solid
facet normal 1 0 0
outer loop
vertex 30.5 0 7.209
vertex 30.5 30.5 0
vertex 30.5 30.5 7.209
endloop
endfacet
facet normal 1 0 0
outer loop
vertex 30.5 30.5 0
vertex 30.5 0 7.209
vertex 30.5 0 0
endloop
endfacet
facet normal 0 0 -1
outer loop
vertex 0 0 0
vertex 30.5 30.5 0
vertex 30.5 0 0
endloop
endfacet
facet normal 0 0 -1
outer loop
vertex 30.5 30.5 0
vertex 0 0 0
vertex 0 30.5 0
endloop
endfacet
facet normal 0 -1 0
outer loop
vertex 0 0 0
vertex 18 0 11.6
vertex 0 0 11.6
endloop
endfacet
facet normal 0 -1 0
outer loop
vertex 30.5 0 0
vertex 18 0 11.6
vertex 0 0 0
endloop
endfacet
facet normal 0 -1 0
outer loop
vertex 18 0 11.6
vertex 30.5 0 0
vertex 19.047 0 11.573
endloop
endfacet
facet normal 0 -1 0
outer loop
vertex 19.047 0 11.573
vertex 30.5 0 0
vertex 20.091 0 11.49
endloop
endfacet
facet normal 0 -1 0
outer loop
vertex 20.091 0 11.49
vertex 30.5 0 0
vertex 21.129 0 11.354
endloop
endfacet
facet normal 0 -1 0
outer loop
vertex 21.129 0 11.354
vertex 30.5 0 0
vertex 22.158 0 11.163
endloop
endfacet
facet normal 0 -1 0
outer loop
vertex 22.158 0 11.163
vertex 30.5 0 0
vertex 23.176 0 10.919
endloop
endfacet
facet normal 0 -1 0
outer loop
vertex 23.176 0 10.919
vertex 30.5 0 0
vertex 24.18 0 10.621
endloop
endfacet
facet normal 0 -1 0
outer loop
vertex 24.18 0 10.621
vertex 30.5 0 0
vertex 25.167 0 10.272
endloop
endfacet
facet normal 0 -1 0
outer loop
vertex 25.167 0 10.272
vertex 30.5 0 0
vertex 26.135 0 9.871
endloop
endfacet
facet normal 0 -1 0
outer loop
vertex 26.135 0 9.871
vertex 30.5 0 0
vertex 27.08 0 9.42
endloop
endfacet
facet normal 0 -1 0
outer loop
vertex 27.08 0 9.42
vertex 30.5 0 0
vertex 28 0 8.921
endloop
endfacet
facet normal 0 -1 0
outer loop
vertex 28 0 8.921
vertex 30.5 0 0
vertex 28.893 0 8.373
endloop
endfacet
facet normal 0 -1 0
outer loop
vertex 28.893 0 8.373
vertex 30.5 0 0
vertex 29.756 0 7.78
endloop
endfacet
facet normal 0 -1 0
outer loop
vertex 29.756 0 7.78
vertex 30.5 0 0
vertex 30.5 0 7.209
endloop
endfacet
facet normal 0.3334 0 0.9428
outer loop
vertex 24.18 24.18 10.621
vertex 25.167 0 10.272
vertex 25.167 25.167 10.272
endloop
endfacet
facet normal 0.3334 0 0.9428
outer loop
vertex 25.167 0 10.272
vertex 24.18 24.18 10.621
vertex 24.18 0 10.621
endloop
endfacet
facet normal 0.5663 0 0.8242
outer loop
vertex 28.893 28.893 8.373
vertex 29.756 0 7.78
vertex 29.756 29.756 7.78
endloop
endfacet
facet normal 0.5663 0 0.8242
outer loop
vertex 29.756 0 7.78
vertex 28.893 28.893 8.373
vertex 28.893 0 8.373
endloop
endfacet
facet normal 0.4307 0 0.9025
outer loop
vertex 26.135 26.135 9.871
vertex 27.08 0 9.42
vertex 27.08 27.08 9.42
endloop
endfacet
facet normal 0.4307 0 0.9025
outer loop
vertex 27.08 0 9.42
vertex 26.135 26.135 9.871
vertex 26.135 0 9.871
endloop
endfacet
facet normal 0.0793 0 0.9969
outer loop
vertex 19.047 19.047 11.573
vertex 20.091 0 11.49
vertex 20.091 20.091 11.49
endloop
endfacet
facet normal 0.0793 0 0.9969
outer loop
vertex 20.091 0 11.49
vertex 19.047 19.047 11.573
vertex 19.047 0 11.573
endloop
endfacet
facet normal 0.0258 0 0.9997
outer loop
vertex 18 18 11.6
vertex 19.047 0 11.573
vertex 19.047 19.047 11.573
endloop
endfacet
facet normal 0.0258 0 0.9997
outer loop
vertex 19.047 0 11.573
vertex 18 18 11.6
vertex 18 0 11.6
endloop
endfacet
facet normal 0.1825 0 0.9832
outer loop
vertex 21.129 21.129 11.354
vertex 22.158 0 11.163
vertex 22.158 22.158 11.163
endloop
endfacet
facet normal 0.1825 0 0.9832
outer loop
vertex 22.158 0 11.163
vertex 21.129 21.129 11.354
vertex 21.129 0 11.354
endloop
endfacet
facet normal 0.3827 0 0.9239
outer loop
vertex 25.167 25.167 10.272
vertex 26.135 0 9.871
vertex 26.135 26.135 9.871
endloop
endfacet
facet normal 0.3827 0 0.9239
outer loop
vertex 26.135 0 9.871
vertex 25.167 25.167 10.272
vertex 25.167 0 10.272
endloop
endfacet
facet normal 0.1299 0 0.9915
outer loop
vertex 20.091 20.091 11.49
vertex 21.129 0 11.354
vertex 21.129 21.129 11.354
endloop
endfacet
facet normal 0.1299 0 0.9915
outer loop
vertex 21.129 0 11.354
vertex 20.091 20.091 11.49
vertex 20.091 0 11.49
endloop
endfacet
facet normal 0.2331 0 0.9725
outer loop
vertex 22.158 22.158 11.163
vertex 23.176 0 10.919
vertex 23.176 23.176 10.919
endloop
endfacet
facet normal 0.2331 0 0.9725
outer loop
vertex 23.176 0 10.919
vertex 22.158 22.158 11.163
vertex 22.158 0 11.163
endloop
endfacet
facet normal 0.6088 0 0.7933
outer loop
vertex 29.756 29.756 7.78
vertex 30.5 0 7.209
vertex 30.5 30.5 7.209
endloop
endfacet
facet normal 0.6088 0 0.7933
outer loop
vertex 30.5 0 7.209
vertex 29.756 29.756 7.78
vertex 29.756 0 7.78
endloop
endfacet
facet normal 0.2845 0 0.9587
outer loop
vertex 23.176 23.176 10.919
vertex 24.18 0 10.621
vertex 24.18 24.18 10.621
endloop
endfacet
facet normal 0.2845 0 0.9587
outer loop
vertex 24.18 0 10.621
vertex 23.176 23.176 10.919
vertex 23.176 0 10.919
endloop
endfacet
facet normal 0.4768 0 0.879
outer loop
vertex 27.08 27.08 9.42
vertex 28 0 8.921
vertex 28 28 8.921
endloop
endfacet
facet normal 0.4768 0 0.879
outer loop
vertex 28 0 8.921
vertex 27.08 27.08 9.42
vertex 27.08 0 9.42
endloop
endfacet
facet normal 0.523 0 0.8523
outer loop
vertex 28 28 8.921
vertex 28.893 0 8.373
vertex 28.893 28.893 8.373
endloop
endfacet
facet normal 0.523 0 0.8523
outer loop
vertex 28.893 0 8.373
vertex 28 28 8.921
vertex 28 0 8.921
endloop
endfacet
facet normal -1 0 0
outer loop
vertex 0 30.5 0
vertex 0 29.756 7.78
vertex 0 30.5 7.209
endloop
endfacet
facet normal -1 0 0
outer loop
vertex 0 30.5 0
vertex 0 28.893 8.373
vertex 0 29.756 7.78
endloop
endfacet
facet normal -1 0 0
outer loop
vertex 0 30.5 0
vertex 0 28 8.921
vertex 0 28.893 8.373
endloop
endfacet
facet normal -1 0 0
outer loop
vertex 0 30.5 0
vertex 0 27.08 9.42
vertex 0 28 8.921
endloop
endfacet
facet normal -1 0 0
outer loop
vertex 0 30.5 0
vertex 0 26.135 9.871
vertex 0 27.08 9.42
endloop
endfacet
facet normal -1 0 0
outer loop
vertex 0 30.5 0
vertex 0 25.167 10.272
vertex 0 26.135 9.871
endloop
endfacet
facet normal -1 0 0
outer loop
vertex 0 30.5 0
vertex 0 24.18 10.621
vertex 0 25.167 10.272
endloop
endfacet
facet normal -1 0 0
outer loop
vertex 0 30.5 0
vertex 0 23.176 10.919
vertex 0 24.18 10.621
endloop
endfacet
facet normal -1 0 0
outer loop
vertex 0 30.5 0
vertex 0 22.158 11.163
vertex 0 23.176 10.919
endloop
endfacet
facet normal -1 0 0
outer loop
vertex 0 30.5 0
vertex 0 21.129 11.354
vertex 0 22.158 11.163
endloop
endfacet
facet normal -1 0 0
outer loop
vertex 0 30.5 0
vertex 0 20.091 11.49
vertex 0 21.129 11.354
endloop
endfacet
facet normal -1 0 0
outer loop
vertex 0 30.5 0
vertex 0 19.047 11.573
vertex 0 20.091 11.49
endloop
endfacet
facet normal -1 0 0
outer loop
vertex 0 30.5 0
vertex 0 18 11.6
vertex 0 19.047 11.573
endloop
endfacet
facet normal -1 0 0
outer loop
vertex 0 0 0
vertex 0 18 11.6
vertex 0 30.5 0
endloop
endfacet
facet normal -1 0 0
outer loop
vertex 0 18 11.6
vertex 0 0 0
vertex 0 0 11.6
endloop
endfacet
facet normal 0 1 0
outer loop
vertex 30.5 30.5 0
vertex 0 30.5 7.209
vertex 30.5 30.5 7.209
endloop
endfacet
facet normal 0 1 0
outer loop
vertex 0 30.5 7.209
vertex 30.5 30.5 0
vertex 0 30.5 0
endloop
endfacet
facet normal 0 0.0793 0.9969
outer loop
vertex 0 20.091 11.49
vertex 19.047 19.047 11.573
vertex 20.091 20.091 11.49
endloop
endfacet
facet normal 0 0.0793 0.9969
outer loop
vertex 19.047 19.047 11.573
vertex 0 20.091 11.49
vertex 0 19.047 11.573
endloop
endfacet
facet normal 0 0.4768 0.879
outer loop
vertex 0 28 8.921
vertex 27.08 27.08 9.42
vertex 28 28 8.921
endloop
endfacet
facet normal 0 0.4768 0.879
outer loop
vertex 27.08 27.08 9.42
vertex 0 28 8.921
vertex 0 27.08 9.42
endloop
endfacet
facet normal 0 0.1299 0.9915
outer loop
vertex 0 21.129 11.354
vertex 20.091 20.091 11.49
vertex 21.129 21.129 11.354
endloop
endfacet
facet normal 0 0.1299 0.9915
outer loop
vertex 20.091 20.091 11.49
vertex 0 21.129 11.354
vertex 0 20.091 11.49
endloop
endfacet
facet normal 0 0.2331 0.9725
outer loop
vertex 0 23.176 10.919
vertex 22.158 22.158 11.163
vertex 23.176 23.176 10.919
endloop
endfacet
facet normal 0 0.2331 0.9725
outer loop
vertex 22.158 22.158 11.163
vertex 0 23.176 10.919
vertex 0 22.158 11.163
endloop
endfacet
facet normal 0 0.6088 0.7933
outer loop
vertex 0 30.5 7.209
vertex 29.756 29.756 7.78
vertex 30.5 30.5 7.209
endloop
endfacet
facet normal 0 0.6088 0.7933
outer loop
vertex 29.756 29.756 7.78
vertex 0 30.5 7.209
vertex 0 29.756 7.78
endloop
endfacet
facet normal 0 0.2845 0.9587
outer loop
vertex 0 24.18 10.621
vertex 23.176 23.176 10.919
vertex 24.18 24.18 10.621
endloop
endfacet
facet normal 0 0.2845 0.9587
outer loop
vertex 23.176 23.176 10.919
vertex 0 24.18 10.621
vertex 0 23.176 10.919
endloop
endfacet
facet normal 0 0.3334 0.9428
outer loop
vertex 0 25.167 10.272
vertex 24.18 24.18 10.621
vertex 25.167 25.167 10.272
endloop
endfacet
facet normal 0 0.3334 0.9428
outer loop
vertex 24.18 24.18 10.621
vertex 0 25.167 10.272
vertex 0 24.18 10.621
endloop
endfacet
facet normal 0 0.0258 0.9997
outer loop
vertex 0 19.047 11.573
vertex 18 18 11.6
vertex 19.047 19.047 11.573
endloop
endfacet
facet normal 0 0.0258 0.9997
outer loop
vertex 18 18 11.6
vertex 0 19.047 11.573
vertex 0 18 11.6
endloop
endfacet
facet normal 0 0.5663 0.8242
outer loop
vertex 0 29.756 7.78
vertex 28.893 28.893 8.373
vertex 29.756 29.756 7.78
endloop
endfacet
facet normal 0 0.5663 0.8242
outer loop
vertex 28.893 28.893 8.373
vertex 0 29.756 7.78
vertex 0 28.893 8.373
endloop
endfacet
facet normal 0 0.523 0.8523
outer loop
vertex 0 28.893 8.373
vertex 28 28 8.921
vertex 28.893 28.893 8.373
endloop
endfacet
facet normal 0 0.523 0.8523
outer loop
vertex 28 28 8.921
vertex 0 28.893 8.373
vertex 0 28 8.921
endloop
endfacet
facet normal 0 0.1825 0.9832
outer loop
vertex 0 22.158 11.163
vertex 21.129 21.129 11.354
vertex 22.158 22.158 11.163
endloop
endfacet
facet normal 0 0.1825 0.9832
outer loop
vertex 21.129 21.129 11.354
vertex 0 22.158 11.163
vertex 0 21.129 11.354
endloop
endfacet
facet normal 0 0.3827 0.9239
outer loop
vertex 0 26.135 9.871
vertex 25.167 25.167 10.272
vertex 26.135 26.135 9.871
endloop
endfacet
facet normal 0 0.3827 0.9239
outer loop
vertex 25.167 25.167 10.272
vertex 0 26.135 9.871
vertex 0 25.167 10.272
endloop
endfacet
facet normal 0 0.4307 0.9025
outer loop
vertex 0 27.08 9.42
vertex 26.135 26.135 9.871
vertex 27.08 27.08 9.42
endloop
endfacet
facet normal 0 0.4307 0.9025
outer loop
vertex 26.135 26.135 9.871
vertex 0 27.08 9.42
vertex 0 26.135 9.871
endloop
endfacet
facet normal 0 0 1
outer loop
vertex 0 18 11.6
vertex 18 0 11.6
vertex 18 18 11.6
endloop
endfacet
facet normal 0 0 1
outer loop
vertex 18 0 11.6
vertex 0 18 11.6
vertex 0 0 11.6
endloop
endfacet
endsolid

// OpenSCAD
//
// mensi cast 18x18mm
cp1 = 30.5;
roh1 = 18;
vroh1 = 11.6;
$fn=120;

module centralpart () {
  cube([roh1,roh1,vroh1]);
  intersection(){
       translate([roh1,0,0]) cube([cp1-roh1,cp1,vroh1]);
       translate([roh1,0,vroh1-20]) rotate([270,0,0]) cylinder(d=40,h=roh1);
      }
  intersection(){
       translate([0,roh1,0]) cube([cp1,cp1-roh1,vroh1]);
       translate([0,roh1,vroh1-20]) rotate([180,270,0]) cylinder(d=40,h=roh1);
      }
  intersection(){
       translate([roh1,roh1,0]) cube([cp1-roh1,cp1-roh1,vroh1]);
       translate([roh1,roh1,vroh1-20]) rotate([180,270,0]) cylinder(d=40,h=roh1);
       translate([roh1,roh1,vroh1-20]) rotate([270,0,0]) cylinder(d=40,h=roh1);
      }
}

centralpart();
